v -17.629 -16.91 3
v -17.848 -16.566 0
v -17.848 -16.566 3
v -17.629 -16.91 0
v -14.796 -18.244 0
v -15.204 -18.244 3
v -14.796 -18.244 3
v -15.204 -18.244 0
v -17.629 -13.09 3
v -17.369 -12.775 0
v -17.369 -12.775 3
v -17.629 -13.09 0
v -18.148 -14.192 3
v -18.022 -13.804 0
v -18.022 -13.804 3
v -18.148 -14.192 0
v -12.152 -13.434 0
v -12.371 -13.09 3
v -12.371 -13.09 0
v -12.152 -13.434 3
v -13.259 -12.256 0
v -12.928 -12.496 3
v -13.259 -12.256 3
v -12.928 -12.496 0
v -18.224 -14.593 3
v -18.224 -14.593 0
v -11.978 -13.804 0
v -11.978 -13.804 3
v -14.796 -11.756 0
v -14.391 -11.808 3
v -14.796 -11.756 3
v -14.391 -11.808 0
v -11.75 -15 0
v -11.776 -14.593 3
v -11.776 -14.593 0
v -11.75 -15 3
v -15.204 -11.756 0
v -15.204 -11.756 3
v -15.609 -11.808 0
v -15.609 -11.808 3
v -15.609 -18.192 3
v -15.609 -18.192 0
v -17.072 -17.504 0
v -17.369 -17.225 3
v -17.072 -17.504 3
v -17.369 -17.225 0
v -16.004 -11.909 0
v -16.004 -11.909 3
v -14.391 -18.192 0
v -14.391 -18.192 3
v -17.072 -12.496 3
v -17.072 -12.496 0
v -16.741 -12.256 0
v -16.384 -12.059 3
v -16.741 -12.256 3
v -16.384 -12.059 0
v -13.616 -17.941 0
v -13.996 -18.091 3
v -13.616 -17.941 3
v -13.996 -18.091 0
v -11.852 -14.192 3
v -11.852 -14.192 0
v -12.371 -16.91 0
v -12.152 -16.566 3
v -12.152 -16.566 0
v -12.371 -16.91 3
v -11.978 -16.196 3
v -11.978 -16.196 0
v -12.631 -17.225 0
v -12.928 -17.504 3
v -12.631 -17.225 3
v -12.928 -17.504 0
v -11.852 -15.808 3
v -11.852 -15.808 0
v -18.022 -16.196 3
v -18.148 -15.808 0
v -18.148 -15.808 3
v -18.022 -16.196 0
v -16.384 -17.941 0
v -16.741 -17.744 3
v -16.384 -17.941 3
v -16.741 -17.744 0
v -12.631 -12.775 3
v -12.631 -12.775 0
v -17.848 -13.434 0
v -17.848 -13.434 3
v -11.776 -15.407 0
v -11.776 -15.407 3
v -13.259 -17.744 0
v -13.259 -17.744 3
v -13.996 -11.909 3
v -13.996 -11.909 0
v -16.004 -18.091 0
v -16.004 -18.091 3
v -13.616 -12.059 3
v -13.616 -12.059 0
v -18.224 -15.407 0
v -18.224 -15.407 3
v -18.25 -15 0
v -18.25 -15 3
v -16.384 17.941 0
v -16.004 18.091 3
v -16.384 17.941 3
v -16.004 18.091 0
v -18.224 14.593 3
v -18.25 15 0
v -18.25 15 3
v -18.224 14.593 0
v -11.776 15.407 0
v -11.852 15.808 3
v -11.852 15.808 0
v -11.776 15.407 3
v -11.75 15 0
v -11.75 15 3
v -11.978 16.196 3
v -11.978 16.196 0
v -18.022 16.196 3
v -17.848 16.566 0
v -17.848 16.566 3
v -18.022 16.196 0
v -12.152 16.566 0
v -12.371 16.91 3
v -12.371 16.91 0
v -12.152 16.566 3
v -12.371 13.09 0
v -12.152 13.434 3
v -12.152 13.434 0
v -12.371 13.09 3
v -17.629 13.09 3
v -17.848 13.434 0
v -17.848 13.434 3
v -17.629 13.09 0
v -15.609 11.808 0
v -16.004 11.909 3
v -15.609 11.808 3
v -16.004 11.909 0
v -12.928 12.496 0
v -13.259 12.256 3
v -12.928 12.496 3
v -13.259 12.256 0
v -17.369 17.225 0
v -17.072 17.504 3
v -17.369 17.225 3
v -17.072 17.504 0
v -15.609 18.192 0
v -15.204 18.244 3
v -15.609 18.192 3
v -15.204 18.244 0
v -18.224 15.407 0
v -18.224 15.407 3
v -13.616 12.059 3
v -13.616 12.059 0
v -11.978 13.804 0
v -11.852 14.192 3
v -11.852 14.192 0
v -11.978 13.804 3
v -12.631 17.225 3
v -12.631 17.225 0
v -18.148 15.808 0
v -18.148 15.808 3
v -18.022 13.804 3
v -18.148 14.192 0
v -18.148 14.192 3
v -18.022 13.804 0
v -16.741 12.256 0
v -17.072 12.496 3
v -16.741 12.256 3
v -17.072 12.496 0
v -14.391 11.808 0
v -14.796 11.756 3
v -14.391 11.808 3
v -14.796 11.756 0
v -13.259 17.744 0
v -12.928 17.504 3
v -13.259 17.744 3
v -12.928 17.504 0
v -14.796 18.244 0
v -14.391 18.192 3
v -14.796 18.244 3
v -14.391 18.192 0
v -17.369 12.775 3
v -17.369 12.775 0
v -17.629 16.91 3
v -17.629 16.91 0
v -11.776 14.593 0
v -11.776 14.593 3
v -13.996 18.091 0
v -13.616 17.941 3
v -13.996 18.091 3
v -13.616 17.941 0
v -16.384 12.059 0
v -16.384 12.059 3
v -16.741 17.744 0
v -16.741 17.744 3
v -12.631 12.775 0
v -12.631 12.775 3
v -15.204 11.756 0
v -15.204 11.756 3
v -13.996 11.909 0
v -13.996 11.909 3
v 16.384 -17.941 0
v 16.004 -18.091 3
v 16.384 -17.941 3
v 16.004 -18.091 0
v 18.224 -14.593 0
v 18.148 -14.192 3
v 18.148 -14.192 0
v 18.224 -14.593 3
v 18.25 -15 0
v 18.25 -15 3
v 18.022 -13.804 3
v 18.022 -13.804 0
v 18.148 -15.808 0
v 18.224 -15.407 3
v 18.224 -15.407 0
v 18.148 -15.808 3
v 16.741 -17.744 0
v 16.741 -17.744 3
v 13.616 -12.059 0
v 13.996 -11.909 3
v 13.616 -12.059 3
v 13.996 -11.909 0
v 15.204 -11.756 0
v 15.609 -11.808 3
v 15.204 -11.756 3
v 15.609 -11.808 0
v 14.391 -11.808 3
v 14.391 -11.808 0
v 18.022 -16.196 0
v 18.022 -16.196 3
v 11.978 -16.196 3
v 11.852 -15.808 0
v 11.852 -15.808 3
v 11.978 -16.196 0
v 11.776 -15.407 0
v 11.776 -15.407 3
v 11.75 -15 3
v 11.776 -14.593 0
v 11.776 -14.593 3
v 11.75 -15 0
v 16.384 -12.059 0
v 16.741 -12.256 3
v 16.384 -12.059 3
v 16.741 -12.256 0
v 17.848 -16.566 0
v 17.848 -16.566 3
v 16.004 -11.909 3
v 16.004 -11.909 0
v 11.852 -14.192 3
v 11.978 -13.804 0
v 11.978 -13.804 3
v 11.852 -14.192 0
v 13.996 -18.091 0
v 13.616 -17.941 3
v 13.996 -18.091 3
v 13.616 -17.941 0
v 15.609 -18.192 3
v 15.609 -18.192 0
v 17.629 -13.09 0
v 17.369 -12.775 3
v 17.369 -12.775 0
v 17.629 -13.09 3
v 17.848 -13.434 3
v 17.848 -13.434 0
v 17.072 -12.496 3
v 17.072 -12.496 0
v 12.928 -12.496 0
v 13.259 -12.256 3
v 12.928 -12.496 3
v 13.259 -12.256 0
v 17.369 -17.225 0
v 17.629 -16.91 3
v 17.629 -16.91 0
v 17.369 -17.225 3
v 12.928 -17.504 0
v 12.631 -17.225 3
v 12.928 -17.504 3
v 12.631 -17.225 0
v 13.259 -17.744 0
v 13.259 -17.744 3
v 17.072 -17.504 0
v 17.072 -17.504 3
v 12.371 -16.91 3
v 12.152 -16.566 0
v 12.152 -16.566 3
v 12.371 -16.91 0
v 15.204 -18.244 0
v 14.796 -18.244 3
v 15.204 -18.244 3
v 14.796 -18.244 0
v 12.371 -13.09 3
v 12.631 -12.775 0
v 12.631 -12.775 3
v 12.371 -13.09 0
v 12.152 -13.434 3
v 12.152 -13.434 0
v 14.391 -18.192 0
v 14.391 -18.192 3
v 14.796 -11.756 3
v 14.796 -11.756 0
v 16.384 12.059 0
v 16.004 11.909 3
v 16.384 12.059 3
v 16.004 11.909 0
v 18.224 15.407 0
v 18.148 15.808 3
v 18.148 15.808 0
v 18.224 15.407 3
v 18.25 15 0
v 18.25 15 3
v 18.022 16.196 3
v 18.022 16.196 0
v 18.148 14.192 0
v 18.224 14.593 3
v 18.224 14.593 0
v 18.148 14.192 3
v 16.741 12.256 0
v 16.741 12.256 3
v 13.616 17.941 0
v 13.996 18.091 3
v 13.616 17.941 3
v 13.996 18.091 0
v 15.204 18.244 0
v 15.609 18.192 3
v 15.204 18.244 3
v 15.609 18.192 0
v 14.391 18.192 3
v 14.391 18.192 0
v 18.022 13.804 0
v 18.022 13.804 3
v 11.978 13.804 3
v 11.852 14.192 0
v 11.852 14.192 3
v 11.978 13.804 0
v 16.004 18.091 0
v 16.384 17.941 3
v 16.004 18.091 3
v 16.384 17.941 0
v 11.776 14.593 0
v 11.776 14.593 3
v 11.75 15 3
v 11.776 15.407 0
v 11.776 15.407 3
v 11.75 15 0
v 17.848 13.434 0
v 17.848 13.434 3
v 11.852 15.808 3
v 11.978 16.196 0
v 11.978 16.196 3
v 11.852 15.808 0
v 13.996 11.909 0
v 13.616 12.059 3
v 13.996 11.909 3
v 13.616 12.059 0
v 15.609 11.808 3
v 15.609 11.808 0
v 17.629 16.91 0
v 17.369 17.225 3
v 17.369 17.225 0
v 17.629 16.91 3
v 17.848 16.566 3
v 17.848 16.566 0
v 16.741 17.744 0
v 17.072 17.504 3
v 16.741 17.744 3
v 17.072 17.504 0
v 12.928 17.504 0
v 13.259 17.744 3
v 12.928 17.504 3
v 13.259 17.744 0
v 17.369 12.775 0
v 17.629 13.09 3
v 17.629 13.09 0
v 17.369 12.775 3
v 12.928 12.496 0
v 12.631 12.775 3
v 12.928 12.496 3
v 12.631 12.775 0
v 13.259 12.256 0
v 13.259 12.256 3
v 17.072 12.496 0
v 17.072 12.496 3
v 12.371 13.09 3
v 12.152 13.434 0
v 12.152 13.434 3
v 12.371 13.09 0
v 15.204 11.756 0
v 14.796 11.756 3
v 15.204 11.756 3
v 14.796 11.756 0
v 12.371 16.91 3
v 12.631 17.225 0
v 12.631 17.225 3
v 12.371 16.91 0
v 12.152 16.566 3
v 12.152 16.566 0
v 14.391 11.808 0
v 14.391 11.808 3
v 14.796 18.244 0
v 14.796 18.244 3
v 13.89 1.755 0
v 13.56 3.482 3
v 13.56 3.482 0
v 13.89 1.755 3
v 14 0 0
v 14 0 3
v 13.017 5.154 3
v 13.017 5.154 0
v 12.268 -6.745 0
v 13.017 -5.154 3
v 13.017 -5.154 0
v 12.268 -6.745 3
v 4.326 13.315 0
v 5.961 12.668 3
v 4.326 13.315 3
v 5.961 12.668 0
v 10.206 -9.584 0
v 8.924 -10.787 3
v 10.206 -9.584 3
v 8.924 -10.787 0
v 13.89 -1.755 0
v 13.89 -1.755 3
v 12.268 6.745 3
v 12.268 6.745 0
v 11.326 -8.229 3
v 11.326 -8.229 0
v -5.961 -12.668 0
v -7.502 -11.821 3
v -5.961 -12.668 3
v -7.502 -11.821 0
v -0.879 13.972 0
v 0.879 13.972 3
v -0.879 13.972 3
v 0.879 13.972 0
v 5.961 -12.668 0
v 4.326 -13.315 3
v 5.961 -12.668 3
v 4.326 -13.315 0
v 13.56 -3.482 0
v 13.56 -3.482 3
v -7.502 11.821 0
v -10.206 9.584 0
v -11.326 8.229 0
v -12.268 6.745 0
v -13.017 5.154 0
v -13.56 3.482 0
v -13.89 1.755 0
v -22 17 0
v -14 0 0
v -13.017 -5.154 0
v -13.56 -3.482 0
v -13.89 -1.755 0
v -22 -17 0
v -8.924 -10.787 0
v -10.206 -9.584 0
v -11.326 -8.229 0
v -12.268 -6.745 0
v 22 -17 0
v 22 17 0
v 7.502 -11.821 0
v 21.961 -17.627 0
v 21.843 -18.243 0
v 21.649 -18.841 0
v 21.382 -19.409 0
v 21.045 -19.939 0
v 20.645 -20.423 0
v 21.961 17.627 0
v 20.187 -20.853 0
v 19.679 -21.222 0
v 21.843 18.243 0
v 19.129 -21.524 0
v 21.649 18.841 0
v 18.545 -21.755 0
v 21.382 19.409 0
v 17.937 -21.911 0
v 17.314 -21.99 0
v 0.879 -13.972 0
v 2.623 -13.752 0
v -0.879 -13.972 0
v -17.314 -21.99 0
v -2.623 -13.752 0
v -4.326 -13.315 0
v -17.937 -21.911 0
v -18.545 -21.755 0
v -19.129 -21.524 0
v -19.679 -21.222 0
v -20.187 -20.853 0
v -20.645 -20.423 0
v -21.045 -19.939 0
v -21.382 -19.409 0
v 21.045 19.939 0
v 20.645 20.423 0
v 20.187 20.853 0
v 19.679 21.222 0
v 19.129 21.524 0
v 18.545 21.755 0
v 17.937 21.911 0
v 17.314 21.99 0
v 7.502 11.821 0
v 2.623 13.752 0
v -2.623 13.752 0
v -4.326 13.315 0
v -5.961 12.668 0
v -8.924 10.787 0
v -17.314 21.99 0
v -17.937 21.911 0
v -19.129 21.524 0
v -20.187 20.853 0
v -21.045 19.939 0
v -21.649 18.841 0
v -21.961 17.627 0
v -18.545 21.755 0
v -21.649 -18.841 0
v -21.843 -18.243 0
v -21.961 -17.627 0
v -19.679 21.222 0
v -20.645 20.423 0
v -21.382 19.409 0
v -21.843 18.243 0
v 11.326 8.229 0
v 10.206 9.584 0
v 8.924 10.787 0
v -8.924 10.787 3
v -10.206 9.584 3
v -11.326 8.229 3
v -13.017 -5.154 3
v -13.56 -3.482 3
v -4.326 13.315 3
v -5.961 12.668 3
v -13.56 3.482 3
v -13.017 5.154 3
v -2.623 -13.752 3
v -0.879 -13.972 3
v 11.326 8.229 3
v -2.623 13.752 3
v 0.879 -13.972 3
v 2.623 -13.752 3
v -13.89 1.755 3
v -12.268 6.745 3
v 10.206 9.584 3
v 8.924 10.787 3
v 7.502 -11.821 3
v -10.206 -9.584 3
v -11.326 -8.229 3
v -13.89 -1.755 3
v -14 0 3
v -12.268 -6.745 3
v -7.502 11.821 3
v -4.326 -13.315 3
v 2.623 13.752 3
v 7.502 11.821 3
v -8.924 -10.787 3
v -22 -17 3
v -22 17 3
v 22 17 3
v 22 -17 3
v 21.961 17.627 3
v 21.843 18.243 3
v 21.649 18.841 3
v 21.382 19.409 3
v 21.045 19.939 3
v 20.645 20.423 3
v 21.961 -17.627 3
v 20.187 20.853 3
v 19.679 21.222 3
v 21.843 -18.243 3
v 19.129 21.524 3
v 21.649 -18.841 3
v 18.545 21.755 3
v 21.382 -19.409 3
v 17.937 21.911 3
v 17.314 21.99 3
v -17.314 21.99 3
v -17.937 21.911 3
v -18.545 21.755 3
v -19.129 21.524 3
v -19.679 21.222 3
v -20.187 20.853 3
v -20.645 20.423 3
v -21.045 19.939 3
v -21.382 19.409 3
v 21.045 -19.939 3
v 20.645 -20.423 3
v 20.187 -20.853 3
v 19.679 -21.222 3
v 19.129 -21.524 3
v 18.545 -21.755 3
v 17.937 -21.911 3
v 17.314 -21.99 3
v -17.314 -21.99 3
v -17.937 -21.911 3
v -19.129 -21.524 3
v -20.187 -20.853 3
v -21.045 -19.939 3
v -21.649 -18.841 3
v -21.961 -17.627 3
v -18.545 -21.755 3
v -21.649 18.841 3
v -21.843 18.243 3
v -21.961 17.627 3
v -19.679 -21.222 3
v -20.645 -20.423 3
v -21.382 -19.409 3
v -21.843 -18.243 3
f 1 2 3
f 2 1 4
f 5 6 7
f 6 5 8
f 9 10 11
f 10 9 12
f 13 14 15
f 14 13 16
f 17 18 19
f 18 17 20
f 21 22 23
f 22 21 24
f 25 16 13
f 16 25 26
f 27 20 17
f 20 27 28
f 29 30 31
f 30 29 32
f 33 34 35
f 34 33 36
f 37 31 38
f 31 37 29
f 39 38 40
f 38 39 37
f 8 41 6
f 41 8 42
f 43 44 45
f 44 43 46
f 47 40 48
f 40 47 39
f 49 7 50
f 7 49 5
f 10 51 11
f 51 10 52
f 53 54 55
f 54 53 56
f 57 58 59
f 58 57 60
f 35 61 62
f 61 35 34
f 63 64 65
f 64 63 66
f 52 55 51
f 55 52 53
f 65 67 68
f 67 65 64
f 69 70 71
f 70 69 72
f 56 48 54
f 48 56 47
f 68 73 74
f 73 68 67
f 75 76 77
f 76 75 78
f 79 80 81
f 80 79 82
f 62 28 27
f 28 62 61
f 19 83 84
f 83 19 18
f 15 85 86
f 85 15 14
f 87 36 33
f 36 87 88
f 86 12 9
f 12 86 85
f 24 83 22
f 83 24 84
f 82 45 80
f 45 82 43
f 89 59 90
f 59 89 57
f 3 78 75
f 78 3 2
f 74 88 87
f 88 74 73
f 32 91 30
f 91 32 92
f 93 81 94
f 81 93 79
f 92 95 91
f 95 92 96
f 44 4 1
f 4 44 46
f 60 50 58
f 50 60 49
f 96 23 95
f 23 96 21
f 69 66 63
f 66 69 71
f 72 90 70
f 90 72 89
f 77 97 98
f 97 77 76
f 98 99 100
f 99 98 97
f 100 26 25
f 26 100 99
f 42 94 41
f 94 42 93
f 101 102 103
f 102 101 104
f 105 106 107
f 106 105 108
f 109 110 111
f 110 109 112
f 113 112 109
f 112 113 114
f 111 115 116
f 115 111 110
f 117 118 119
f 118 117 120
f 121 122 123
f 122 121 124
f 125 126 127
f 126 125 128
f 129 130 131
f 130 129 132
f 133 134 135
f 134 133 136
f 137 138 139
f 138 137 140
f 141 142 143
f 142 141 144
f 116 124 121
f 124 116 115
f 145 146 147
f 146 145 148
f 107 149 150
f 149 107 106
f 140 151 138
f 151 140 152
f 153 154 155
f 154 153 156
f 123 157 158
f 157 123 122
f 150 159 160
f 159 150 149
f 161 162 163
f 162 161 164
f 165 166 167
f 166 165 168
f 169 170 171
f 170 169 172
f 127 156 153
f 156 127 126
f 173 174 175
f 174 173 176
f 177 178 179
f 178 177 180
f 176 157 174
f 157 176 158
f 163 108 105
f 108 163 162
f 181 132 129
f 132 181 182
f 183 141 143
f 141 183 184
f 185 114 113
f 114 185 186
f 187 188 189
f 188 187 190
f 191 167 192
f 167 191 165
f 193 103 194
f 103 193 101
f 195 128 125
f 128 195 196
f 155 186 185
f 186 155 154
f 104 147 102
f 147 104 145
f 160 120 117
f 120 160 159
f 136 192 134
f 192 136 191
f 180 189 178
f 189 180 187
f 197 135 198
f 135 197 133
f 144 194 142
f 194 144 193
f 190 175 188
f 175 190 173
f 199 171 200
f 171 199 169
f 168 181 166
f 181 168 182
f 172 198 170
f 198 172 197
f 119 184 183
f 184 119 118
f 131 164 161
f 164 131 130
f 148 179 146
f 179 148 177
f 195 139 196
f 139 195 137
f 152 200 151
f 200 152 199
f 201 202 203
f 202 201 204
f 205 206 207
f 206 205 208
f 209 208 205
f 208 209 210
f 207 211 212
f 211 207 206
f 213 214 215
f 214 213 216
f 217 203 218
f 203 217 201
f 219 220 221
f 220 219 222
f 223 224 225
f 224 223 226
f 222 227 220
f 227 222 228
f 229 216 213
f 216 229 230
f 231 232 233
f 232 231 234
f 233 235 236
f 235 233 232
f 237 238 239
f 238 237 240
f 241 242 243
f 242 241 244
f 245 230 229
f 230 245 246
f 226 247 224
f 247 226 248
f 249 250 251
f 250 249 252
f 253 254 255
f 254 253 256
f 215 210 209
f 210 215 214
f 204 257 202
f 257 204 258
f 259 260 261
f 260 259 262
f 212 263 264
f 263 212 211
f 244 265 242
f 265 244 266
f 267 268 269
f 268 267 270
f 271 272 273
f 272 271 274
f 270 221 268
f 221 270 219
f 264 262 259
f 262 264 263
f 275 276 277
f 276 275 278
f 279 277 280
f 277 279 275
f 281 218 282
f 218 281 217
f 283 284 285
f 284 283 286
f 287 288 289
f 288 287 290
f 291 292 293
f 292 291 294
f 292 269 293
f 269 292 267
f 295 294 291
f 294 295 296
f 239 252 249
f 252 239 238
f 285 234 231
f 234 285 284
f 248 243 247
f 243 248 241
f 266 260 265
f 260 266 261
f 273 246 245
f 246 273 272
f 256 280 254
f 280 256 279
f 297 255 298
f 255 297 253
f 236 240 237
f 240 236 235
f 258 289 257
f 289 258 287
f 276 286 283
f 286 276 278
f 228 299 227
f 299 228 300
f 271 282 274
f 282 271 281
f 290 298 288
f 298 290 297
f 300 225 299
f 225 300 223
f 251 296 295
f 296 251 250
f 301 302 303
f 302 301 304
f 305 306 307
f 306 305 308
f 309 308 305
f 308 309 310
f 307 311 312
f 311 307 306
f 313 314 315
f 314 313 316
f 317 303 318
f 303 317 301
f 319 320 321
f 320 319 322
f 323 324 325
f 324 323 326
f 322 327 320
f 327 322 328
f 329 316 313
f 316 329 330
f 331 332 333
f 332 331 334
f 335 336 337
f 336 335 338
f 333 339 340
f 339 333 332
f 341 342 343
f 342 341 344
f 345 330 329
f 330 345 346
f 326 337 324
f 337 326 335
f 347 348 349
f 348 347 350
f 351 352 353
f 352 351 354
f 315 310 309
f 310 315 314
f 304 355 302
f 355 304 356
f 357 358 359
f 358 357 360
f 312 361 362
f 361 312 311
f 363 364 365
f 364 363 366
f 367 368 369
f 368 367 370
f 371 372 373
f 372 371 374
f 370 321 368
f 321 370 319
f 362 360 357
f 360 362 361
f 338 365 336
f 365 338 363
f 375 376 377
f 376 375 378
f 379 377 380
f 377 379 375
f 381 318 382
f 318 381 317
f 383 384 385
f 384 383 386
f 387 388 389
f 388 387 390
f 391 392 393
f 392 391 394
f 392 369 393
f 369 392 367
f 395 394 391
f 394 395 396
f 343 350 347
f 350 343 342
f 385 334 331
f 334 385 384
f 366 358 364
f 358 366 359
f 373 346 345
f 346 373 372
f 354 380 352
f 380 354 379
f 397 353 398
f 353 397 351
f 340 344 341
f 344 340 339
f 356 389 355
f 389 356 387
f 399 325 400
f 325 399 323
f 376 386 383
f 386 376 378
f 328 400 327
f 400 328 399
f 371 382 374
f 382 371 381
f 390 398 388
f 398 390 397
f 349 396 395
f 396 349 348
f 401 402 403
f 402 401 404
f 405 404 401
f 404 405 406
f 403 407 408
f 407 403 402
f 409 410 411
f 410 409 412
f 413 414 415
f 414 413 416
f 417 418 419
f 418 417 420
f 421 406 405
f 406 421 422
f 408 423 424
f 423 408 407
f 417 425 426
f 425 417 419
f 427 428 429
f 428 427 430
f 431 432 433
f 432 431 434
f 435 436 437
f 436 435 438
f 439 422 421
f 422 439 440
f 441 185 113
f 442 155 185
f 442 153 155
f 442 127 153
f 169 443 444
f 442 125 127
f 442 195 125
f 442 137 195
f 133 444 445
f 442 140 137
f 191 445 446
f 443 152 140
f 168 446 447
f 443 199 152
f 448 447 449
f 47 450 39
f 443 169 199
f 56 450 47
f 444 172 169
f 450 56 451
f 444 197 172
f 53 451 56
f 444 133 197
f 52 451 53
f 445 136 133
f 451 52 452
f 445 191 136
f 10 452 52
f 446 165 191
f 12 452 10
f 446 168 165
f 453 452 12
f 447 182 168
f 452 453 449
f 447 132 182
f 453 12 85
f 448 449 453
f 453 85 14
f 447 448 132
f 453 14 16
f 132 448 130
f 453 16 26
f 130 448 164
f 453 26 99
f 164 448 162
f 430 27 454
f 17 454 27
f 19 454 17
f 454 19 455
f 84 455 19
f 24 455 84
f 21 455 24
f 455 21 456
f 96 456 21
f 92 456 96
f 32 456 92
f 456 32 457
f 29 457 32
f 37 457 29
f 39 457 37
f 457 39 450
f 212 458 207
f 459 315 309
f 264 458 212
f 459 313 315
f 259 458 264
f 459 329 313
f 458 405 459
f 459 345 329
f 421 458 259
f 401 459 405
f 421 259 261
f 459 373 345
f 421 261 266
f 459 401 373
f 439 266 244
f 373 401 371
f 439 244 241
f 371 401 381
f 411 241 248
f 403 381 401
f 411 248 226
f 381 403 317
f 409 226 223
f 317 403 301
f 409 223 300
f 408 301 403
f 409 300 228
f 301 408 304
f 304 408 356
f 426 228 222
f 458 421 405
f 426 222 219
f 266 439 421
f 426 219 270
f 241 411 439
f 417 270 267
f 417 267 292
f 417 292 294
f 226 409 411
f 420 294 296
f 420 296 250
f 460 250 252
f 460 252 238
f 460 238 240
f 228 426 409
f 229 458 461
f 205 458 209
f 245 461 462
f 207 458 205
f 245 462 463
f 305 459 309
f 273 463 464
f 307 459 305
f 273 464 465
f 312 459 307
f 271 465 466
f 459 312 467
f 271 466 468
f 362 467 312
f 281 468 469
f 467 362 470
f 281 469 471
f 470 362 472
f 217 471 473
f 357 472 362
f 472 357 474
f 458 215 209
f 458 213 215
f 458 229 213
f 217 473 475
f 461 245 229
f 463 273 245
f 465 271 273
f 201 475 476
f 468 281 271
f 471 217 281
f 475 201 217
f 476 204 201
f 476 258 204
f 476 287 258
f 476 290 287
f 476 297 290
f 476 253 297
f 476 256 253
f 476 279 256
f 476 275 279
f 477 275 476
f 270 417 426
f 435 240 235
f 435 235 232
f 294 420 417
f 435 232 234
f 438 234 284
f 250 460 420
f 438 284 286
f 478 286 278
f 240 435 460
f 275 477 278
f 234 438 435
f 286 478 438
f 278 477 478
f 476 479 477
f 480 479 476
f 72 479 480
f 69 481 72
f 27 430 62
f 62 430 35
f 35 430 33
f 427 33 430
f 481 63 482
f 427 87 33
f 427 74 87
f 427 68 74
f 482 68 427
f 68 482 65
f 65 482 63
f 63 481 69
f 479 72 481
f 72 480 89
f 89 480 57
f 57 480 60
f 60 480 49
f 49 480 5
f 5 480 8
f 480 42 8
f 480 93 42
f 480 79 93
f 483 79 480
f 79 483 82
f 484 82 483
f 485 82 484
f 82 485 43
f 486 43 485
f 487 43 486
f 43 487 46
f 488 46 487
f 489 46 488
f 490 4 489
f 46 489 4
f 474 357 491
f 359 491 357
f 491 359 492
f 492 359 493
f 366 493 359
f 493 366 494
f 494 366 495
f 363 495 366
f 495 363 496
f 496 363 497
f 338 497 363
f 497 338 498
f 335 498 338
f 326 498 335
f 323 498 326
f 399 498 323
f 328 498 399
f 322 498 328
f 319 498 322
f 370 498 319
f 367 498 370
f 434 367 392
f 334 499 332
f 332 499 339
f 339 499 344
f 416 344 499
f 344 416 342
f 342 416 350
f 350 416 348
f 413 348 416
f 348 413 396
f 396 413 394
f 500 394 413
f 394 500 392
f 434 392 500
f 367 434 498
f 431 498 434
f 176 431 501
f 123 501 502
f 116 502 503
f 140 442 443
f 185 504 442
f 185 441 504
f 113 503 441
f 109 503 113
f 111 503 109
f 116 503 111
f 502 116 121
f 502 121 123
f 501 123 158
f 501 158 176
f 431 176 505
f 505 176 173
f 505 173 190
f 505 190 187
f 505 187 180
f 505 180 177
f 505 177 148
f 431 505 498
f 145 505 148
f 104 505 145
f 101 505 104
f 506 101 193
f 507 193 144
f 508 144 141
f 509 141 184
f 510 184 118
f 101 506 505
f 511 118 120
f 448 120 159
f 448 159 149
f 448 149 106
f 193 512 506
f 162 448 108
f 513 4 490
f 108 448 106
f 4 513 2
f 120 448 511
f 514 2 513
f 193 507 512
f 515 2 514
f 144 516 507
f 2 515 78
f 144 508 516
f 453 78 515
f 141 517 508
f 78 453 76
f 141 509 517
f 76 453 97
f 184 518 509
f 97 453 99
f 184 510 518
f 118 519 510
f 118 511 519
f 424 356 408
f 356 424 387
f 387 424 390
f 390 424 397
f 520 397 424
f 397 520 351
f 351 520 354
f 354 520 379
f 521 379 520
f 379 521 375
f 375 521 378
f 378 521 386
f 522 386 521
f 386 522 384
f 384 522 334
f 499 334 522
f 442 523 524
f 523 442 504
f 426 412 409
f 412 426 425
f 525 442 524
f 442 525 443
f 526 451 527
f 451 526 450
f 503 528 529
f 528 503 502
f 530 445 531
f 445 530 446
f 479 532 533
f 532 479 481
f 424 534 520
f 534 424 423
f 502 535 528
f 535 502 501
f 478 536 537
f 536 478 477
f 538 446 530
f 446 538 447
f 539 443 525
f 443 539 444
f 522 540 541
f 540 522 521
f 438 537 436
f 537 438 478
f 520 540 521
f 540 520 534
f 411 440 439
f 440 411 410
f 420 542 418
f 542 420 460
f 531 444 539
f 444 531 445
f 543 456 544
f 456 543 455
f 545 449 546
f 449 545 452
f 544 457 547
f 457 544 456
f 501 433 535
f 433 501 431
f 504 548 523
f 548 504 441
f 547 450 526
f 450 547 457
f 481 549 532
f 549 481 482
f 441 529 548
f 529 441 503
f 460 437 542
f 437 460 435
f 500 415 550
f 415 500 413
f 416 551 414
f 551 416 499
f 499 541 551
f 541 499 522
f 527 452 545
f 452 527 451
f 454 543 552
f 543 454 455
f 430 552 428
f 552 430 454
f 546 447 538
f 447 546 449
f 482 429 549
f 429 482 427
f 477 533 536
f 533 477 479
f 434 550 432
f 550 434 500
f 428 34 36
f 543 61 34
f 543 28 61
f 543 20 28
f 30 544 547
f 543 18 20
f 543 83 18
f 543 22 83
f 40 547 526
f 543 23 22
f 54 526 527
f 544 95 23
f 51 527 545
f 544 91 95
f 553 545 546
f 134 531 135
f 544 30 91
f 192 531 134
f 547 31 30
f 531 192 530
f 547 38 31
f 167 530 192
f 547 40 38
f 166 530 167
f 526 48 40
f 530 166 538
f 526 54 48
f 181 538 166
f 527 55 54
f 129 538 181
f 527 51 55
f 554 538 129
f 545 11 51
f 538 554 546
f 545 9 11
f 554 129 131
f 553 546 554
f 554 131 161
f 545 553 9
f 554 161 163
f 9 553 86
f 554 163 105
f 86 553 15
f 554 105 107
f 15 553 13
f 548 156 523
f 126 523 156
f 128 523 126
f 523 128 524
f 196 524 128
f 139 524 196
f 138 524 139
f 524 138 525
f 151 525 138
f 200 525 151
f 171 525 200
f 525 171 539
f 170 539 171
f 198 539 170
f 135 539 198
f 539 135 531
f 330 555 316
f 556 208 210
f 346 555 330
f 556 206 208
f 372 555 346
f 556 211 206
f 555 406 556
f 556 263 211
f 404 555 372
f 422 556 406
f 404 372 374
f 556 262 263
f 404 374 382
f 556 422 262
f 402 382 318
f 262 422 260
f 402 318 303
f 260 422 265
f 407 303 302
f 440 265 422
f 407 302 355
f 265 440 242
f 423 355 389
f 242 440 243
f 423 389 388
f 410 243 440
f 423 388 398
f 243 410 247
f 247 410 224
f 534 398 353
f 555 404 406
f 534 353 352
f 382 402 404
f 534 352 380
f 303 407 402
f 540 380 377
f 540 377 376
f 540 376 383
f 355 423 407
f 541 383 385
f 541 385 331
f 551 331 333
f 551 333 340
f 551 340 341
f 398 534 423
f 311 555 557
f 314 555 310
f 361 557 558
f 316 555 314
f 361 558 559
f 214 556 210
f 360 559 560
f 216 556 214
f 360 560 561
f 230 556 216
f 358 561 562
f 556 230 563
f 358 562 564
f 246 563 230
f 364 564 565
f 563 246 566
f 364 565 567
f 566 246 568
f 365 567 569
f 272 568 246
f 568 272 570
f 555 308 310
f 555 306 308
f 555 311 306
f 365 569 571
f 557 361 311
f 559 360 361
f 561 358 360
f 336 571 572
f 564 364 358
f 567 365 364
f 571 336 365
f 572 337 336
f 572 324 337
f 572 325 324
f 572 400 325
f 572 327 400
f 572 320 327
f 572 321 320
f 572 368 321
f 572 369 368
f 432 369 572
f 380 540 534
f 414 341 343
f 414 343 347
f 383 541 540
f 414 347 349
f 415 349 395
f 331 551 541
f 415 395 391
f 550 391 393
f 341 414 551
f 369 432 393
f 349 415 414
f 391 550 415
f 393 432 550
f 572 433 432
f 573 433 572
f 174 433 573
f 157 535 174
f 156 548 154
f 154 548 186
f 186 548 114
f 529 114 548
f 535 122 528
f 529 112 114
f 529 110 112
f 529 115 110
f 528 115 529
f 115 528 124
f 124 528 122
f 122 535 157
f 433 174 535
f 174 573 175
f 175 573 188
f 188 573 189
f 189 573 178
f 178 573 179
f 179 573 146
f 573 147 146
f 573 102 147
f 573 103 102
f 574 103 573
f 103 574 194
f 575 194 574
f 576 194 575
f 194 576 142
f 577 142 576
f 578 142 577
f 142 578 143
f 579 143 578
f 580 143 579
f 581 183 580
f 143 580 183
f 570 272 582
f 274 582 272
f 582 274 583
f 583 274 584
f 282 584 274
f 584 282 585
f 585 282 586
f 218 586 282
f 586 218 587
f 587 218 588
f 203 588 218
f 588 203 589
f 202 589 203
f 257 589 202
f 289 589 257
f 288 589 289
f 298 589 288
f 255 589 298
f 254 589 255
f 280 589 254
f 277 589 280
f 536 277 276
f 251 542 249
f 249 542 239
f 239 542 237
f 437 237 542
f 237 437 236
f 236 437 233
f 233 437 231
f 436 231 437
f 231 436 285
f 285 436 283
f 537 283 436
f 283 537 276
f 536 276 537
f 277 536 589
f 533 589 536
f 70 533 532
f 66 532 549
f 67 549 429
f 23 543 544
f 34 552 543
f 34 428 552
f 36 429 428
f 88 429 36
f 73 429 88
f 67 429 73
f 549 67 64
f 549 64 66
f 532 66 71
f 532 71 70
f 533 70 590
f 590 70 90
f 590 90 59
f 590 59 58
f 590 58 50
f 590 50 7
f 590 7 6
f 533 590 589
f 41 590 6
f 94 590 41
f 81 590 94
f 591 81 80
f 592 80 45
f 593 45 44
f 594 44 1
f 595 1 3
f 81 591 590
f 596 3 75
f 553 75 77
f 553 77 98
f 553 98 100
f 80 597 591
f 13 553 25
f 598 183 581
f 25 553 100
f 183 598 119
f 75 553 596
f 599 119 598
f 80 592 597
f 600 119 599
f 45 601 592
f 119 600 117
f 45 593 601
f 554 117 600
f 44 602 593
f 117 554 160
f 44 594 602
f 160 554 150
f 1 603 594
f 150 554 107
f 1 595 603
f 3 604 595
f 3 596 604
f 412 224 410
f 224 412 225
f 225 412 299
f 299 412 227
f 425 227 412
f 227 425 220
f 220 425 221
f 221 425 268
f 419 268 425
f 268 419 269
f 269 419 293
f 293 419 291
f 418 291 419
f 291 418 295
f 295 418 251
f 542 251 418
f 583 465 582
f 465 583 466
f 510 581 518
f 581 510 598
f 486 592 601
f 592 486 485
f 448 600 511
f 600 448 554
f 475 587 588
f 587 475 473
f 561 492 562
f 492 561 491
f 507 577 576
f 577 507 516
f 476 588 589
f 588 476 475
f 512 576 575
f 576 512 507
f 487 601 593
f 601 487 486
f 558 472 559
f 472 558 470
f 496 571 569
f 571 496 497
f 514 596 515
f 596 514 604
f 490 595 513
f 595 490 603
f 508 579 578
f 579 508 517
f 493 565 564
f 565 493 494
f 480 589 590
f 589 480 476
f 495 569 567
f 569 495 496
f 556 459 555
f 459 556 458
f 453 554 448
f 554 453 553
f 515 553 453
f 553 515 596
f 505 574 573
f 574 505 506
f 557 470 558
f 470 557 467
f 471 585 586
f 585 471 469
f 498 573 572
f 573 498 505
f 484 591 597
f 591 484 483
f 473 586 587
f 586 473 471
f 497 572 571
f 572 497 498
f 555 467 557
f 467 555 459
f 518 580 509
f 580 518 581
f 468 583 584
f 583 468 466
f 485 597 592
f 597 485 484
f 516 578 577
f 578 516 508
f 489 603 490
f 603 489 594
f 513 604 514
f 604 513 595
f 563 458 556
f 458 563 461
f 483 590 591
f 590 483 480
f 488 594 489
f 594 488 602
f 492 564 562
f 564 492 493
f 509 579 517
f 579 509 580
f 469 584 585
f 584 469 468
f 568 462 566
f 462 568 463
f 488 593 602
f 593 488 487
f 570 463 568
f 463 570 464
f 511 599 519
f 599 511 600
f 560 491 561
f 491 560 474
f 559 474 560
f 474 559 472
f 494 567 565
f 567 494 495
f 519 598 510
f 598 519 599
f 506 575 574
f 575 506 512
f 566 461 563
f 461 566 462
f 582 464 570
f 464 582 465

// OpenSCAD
$fn = 50;


difference() {
	union() {
		hull() {
			translate(v = [-17.0000000000, 17.0000000000, 0]) {
				cylinder(h = 3, r = 5);
			}
			translate(v = [17.0000000000, 17.0000000000, 0]) {
				cylinder(h = 3, r = 5);
			}
			translate(v = [-17.0000000000, -17.0000000000, 0]) {
				cylinder(h = 3, r = 5);
			}
			translate(v = [17.0000000000, -17.0000000000, 0]) {
				cylinder(h = 3, r = 5);
			}
		}
	}
	union() {
		#translate(v = [-15.0000000000, -15.0000000000, -100.0000000000]) {
			cylinder(h = 200, r = 3.2500000000);
		}
		#translate(v = [-15.0000000000, 15.0000000000, -100.0000000000]) {
			cylinder(h = 200, r = 3.2500000000);
		}
		#translate(v = [15.0000000000, -15.0000000000, -100.0000000000]) {
			cylinder(h = 200, r = 3.2500000000);
		}
		#translate(v = [15.0000000000, 15.0000000000, -100.0000000000]) {
			cylinder(h = 200, r = 3.2500000000);
		}
		#cylinder(h = 3, r = 14.0000000000);
	}
}
